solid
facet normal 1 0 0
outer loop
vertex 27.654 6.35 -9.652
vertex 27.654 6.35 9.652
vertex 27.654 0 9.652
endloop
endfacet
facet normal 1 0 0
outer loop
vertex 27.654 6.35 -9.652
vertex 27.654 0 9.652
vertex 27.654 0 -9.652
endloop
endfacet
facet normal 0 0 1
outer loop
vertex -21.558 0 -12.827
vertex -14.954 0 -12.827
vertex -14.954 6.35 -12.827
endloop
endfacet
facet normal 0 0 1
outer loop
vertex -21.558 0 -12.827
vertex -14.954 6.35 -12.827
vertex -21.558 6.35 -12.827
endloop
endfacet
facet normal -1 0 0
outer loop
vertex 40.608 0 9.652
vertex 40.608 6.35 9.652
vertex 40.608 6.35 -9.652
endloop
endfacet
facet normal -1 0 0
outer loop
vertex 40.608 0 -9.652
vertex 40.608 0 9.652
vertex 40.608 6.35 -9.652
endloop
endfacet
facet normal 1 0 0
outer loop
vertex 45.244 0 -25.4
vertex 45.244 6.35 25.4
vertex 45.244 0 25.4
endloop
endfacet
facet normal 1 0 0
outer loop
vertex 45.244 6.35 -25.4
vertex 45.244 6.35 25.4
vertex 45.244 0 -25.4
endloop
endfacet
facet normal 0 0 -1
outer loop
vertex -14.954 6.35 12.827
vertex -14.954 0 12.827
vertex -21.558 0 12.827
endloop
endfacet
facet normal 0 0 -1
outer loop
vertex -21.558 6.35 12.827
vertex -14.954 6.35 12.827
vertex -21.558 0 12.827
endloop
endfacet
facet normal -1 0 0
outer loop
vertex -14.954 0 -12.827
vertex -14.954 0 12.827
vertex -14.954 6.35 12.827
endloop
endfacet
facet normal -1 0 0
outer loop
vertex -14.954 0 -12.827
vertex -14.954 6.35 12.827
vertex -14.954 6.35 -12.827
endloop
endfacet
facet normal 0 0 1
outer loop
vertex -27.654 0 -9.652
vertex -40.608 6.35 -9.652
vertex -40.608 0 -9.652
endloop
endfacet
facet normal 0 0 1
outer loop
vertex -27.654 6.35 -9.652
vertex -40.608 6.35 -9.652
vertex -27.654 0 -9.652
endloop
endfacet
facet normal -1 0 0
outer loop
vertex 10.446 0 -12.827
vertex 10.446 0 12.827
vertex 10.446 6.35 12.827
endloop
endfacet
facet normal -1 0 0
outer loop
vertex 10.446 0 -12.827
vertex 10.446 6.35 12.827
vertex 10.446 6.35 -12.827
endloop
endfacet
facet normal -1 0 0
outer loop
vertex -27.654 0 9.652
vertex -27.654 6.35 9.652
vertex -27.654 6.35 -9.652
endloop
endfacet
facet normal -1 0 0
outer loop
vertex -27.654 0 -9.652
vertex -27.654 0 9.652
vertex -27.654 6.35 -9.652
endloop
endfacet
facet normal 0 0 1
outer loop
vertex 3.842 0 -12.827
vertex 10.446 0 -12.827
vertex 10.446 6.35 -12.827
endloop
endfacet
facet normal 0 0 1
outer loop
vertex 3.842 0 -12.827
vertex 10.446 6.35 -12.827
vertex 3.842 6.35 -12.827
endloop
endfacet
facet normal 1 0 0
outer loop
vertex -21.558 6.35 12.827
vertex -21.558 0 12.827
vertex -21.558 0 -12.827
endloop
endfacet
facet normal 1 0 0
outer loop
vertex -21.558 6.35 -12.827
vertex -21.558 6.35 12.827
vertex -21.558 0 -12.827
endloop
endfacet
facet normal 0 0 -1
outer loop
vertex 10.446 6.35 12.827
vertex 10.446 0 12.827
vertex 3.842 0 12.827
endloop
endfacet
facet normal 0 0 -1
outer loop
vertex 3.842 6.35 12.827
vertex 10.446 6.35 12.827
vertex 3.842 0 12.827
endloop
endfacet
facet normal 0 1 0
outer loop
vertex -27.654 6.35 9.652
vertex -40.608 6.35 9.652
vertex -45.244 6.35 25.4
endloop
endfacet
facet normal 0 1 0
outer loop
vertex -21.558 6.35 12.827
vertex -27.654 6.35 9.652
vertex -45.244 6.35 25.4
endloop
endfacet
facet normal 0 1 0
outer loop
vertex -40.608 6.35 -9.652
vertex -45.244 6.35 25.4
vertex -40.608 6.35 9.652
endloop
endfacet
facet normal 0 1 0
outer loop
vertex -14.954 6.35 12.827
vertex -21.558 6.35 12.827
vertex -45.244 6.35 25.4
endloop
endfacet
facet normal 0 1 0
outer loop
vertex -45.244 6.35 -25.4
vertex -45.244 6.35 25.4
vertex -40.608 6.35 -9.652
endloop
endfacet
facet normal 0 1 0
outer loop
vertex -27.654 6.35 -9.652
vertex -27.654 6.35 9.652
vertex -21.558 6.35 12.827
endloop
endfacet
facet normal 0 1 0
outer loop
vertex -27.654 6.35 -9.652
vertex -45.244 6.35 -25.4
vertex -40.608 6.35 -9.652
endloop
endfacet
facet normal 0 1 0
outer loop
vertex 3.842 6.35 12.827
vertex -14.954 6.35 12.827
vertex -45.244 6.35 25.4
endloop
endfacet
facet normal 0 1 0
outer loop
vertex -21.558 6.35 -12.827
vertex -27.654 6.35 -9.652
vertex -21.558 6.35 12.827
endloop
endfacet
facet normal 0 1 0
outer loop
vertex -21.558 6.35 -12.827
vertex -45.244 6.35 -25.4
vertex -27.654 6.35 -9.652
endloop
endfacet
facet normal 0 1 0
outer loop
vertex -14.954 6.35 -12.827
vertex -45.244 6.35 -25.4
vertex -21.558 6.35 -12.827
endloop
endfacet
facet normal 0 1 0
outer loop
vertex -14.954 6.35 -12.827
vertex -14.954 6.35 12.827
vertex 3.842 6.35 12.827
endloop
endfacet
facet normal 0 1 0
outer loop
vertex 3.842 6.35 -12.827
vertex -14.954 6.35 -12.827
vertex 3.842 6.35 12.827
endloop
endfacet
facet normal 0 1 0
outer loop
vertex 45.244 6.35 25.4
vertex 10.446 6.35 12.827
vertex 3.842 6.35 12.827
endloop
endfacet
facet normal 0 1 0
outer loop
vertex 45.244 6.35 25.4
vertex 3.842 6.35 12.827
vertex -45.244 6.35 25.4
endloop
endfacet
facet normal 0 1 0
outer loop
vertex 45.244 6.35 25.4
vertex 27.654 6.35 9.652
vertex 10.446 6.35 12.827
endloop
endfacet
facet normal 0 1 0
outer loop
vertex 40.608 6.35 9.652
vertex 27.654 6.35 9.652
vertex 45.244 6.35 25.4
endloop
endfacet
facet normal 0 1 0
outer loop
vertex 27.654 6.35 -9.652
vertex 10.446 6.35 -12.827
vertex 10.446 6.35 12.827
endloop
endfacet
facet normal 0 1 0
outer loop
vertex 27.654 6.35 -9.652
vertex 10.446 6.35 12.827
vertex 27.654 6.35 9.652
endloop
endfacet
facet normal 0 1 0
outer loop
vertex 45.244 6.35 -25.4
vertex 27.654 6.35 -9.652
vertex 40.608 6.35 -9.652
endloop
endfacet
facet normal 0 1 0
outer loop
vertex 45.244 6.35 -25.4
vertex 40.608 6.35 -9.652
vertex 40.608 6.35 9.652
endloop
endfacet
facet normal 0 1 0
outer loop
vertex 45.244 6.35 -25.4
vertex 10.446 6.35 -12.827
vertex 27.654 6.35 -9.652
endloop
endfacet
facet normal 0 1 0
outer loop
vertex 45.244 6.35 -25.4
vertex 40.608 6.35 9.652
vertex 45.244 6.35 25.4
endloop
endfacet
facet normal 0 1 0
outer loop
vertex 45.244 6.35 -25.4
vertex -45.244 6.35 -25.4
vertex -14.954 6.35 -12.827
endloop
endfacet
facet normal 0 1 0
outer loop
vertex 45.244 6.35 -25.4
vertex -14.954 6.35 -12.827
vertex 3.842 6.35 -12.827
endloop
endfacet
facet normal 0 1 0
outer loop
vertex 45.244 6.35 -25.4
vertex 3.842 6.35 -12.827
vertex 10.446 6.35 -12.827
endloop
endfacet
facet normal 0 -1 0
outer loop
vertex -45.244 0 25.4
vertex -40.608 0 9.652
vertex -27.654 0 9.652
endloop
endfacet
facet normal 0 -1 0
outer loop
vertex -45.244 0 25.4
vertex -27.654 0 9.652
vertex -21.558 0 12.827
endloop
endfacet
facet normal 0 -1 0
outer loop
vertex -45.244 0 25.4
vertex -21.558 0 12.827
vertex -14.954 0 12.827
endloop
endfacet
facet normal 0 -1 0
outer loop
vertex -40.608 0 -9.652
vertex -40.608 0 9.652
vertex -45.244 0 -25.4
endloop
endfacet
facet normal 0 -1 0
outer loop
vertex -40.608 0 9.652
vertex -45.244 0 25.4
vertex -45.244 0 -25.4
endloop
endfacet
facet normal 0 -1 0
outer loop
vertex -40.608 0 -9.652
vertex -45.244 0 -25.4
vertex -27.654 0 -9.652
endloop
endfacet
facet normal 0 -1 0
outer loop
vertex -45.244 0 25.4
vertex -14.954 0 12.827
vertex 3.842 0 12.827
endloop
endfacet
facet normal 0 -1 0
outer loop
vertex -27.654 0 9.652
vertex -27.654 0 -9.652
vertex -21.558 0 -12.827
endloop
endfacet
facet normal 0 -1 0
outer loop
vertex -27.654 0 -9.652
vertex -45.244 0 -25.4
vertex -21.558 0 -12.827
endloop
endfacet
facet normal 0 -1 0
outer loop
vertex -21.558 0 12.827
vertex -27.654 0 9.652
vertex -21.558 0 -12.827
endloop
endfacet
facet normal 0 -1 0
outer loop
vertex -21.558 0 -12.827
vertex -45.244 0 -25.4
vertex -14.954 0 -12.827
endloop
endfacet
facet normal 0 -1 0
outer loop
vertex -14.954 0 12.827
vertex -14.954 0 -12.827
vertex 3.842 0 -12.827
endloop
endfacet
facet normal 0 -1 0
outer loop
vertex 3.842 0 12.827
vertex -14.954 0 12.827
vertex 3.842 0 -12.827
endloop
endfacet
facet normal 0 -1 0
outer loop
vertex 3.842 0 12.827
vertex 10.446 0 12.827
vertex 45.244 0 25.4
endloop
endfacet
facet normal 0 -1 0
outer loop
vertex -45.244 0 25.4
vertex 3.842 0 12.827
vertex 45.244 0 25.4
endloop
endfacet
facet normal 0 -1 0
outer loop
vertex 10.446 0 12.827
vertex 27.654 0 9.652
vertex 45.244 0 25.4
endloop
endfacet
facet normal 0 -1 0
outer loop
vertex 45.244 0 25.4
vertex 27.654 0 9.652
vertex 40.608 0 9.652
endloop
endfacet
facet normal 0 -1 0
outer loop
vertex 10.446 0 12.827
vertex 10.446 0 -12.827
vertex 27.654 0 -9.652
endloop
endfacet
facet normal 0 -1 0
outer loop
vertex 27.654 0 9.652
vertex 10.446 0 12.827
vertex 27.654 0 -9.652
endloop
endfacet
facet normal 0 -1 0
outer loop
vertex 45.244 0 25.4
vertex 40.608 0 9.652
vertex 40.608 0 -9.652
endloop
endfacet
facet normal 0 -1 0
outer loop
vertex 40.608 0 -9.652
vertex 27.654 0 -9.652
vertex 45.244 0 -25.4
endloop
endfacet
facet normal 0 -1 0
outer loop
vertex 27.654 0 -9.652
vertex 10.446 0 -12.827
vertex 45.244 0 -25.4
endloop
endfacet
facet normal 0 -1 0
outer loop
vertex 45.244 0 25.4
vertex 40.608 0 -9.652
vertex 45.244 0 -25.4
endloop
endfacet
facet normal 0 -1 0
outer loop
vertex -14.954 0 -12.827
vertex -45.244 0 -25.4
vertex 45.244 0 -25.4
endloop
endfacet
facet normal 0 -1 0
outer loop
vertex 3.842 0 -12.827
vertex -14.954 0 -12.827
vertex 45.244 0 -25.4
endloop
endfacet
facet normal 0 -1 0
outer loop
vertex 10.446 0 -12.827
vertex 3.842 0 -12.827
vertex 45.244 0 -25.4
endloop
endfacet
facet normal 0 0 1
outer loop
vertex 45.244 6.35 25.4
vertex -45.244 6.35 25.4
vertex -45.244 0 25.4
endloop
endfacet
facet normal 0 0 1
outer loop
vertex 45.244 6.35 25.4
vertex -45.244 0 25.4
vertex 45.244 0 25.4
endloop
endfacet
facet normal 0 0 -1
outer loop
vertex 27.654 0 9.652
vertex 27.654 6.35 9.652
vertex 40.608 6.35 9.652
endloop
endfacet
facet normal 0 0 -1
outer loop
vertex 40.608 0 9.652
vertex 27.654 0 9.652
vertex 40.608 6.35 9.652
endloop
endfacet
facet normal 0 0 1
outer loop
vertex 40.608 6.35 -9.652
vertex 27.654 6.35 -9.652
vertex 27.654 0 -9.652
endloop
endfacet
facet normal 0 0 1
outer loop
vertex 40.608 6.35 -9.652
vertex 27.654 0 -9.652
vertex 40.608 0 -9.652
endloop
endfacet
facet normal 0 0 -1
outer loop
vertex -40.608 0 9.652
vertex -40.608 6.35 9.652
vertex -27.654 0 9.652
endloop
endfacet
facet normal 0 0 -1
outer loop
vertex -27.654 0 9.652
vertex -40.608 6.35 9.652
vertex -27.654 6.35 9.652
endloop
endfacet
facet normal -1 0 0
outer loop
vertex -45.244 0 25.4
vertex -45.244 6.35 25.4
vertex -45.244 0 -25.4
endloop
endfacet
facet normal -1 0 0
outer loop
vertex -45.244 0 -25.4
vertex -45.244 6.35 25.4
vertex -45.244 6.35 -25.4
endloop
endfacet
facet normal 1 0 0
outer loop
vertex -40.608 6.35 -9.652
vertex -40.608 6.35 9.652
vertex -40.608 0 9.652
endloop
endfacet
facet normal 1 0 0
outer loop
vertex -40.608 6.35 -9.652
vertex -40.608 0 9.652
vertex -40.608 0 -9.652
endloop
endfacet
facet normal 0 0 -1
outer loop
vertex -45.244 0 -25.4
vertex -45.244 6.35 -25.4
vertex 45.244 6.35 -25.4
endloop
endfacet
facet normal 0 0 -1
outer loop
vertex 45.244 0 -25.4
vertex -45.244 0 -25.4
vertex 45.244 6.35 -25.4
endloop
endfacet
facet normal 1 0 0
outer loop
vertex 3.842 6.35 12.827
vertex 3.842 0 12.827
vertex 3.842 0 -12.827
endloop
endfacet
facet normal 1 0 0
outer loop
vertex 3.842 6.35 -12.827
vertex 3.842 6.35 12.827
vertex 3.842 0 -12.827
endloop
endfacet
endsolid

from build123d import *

# Parameters (mm, degrees)
SKETCH1_W           = 80.9625
SKETCH1_H           = 50.8
BOSS_EXTRUDE1_DEPTH = 6.35
SKETCH3_W           = 6.604
SKETCH3_H           = 25.654
CUT_EXTRUDE1_DEPTH  = 7.35
SKETCH4_W           = 4.7625
SKETCH4_H           = 50.8
BOSS_EXTRUDE2_DEPTH = 6.35
SKETCH5_W           = 12.954
SKETCH5_H           = 19.304
CUT_EXTRUDE2_DEPTH  = 7.35


with BuildPart() as part:
    # Sketch1 → Boss-Extrude1 (new body)
    with BuildSketch(Plane(origin=(0, 0, 0), x_dir=(1, 0, 0), z_dir=(0, 1, 0))):
        Rectangle(SKETCH1_W, SKETCH1_H)
    extrude(amount=BOSS_EXTRUDE1_DEPTH)

    # Sketch3 → Cut-Extrude1 (cut, through all)
    with BuildSketch(Plane(origin=(0, 0, 0), x_dir=(-1, 0, 0), z_dir=(0, -1, 0))):
        with Locations((18.25625, 0)):
            Rectangle(SKETCH3_W, SKETCH3_H)
        with Locations((-7.14375, 0)):
            Rectangle(SKETCH3_W, SKETCH3_H)
    extrude(amount=-CUT_EXTRUDE1_DEPTH, mode=Mode.SUBTRACT)

    # Sketch4 → Boss-Extrude2 (add)
    with BuildSketch(Plane(origin=(0, 6.35, 0), x_dir=(1, 0, 0), z_dir=(0, 1, 0))):
        with Locations((-42.8625, 0)):
            Rectangle(SKETCH4_W, SKETCH4_H)
        with Locations((42.8625, 0)):
            Rectangle(SKETCH4_W, SKETCH4_H)
    extrude(amount=-BOSS_EXTRUDE2_DEPTH)

    # Sketch5 → Cut-Extrude2 (cut, through all)
    with BuildSketch(Plane(origin=(0, 6.35, 0), x_dir=(1, 0, 0), z_dir=(0, 1, 0))):
        with Locations((34.13125, 0)):
            Rectangle(SKETCH5_W, SKETCH5_H)
        with Locations((-34.13125, 0)):
            Rectangle(SKETCH5_W, SKETCH5_H)
    extrude(amount=-CUT_EXTRUDE2_DEPTH, mode=Mode.SUBTRACT)


solid = part.part
